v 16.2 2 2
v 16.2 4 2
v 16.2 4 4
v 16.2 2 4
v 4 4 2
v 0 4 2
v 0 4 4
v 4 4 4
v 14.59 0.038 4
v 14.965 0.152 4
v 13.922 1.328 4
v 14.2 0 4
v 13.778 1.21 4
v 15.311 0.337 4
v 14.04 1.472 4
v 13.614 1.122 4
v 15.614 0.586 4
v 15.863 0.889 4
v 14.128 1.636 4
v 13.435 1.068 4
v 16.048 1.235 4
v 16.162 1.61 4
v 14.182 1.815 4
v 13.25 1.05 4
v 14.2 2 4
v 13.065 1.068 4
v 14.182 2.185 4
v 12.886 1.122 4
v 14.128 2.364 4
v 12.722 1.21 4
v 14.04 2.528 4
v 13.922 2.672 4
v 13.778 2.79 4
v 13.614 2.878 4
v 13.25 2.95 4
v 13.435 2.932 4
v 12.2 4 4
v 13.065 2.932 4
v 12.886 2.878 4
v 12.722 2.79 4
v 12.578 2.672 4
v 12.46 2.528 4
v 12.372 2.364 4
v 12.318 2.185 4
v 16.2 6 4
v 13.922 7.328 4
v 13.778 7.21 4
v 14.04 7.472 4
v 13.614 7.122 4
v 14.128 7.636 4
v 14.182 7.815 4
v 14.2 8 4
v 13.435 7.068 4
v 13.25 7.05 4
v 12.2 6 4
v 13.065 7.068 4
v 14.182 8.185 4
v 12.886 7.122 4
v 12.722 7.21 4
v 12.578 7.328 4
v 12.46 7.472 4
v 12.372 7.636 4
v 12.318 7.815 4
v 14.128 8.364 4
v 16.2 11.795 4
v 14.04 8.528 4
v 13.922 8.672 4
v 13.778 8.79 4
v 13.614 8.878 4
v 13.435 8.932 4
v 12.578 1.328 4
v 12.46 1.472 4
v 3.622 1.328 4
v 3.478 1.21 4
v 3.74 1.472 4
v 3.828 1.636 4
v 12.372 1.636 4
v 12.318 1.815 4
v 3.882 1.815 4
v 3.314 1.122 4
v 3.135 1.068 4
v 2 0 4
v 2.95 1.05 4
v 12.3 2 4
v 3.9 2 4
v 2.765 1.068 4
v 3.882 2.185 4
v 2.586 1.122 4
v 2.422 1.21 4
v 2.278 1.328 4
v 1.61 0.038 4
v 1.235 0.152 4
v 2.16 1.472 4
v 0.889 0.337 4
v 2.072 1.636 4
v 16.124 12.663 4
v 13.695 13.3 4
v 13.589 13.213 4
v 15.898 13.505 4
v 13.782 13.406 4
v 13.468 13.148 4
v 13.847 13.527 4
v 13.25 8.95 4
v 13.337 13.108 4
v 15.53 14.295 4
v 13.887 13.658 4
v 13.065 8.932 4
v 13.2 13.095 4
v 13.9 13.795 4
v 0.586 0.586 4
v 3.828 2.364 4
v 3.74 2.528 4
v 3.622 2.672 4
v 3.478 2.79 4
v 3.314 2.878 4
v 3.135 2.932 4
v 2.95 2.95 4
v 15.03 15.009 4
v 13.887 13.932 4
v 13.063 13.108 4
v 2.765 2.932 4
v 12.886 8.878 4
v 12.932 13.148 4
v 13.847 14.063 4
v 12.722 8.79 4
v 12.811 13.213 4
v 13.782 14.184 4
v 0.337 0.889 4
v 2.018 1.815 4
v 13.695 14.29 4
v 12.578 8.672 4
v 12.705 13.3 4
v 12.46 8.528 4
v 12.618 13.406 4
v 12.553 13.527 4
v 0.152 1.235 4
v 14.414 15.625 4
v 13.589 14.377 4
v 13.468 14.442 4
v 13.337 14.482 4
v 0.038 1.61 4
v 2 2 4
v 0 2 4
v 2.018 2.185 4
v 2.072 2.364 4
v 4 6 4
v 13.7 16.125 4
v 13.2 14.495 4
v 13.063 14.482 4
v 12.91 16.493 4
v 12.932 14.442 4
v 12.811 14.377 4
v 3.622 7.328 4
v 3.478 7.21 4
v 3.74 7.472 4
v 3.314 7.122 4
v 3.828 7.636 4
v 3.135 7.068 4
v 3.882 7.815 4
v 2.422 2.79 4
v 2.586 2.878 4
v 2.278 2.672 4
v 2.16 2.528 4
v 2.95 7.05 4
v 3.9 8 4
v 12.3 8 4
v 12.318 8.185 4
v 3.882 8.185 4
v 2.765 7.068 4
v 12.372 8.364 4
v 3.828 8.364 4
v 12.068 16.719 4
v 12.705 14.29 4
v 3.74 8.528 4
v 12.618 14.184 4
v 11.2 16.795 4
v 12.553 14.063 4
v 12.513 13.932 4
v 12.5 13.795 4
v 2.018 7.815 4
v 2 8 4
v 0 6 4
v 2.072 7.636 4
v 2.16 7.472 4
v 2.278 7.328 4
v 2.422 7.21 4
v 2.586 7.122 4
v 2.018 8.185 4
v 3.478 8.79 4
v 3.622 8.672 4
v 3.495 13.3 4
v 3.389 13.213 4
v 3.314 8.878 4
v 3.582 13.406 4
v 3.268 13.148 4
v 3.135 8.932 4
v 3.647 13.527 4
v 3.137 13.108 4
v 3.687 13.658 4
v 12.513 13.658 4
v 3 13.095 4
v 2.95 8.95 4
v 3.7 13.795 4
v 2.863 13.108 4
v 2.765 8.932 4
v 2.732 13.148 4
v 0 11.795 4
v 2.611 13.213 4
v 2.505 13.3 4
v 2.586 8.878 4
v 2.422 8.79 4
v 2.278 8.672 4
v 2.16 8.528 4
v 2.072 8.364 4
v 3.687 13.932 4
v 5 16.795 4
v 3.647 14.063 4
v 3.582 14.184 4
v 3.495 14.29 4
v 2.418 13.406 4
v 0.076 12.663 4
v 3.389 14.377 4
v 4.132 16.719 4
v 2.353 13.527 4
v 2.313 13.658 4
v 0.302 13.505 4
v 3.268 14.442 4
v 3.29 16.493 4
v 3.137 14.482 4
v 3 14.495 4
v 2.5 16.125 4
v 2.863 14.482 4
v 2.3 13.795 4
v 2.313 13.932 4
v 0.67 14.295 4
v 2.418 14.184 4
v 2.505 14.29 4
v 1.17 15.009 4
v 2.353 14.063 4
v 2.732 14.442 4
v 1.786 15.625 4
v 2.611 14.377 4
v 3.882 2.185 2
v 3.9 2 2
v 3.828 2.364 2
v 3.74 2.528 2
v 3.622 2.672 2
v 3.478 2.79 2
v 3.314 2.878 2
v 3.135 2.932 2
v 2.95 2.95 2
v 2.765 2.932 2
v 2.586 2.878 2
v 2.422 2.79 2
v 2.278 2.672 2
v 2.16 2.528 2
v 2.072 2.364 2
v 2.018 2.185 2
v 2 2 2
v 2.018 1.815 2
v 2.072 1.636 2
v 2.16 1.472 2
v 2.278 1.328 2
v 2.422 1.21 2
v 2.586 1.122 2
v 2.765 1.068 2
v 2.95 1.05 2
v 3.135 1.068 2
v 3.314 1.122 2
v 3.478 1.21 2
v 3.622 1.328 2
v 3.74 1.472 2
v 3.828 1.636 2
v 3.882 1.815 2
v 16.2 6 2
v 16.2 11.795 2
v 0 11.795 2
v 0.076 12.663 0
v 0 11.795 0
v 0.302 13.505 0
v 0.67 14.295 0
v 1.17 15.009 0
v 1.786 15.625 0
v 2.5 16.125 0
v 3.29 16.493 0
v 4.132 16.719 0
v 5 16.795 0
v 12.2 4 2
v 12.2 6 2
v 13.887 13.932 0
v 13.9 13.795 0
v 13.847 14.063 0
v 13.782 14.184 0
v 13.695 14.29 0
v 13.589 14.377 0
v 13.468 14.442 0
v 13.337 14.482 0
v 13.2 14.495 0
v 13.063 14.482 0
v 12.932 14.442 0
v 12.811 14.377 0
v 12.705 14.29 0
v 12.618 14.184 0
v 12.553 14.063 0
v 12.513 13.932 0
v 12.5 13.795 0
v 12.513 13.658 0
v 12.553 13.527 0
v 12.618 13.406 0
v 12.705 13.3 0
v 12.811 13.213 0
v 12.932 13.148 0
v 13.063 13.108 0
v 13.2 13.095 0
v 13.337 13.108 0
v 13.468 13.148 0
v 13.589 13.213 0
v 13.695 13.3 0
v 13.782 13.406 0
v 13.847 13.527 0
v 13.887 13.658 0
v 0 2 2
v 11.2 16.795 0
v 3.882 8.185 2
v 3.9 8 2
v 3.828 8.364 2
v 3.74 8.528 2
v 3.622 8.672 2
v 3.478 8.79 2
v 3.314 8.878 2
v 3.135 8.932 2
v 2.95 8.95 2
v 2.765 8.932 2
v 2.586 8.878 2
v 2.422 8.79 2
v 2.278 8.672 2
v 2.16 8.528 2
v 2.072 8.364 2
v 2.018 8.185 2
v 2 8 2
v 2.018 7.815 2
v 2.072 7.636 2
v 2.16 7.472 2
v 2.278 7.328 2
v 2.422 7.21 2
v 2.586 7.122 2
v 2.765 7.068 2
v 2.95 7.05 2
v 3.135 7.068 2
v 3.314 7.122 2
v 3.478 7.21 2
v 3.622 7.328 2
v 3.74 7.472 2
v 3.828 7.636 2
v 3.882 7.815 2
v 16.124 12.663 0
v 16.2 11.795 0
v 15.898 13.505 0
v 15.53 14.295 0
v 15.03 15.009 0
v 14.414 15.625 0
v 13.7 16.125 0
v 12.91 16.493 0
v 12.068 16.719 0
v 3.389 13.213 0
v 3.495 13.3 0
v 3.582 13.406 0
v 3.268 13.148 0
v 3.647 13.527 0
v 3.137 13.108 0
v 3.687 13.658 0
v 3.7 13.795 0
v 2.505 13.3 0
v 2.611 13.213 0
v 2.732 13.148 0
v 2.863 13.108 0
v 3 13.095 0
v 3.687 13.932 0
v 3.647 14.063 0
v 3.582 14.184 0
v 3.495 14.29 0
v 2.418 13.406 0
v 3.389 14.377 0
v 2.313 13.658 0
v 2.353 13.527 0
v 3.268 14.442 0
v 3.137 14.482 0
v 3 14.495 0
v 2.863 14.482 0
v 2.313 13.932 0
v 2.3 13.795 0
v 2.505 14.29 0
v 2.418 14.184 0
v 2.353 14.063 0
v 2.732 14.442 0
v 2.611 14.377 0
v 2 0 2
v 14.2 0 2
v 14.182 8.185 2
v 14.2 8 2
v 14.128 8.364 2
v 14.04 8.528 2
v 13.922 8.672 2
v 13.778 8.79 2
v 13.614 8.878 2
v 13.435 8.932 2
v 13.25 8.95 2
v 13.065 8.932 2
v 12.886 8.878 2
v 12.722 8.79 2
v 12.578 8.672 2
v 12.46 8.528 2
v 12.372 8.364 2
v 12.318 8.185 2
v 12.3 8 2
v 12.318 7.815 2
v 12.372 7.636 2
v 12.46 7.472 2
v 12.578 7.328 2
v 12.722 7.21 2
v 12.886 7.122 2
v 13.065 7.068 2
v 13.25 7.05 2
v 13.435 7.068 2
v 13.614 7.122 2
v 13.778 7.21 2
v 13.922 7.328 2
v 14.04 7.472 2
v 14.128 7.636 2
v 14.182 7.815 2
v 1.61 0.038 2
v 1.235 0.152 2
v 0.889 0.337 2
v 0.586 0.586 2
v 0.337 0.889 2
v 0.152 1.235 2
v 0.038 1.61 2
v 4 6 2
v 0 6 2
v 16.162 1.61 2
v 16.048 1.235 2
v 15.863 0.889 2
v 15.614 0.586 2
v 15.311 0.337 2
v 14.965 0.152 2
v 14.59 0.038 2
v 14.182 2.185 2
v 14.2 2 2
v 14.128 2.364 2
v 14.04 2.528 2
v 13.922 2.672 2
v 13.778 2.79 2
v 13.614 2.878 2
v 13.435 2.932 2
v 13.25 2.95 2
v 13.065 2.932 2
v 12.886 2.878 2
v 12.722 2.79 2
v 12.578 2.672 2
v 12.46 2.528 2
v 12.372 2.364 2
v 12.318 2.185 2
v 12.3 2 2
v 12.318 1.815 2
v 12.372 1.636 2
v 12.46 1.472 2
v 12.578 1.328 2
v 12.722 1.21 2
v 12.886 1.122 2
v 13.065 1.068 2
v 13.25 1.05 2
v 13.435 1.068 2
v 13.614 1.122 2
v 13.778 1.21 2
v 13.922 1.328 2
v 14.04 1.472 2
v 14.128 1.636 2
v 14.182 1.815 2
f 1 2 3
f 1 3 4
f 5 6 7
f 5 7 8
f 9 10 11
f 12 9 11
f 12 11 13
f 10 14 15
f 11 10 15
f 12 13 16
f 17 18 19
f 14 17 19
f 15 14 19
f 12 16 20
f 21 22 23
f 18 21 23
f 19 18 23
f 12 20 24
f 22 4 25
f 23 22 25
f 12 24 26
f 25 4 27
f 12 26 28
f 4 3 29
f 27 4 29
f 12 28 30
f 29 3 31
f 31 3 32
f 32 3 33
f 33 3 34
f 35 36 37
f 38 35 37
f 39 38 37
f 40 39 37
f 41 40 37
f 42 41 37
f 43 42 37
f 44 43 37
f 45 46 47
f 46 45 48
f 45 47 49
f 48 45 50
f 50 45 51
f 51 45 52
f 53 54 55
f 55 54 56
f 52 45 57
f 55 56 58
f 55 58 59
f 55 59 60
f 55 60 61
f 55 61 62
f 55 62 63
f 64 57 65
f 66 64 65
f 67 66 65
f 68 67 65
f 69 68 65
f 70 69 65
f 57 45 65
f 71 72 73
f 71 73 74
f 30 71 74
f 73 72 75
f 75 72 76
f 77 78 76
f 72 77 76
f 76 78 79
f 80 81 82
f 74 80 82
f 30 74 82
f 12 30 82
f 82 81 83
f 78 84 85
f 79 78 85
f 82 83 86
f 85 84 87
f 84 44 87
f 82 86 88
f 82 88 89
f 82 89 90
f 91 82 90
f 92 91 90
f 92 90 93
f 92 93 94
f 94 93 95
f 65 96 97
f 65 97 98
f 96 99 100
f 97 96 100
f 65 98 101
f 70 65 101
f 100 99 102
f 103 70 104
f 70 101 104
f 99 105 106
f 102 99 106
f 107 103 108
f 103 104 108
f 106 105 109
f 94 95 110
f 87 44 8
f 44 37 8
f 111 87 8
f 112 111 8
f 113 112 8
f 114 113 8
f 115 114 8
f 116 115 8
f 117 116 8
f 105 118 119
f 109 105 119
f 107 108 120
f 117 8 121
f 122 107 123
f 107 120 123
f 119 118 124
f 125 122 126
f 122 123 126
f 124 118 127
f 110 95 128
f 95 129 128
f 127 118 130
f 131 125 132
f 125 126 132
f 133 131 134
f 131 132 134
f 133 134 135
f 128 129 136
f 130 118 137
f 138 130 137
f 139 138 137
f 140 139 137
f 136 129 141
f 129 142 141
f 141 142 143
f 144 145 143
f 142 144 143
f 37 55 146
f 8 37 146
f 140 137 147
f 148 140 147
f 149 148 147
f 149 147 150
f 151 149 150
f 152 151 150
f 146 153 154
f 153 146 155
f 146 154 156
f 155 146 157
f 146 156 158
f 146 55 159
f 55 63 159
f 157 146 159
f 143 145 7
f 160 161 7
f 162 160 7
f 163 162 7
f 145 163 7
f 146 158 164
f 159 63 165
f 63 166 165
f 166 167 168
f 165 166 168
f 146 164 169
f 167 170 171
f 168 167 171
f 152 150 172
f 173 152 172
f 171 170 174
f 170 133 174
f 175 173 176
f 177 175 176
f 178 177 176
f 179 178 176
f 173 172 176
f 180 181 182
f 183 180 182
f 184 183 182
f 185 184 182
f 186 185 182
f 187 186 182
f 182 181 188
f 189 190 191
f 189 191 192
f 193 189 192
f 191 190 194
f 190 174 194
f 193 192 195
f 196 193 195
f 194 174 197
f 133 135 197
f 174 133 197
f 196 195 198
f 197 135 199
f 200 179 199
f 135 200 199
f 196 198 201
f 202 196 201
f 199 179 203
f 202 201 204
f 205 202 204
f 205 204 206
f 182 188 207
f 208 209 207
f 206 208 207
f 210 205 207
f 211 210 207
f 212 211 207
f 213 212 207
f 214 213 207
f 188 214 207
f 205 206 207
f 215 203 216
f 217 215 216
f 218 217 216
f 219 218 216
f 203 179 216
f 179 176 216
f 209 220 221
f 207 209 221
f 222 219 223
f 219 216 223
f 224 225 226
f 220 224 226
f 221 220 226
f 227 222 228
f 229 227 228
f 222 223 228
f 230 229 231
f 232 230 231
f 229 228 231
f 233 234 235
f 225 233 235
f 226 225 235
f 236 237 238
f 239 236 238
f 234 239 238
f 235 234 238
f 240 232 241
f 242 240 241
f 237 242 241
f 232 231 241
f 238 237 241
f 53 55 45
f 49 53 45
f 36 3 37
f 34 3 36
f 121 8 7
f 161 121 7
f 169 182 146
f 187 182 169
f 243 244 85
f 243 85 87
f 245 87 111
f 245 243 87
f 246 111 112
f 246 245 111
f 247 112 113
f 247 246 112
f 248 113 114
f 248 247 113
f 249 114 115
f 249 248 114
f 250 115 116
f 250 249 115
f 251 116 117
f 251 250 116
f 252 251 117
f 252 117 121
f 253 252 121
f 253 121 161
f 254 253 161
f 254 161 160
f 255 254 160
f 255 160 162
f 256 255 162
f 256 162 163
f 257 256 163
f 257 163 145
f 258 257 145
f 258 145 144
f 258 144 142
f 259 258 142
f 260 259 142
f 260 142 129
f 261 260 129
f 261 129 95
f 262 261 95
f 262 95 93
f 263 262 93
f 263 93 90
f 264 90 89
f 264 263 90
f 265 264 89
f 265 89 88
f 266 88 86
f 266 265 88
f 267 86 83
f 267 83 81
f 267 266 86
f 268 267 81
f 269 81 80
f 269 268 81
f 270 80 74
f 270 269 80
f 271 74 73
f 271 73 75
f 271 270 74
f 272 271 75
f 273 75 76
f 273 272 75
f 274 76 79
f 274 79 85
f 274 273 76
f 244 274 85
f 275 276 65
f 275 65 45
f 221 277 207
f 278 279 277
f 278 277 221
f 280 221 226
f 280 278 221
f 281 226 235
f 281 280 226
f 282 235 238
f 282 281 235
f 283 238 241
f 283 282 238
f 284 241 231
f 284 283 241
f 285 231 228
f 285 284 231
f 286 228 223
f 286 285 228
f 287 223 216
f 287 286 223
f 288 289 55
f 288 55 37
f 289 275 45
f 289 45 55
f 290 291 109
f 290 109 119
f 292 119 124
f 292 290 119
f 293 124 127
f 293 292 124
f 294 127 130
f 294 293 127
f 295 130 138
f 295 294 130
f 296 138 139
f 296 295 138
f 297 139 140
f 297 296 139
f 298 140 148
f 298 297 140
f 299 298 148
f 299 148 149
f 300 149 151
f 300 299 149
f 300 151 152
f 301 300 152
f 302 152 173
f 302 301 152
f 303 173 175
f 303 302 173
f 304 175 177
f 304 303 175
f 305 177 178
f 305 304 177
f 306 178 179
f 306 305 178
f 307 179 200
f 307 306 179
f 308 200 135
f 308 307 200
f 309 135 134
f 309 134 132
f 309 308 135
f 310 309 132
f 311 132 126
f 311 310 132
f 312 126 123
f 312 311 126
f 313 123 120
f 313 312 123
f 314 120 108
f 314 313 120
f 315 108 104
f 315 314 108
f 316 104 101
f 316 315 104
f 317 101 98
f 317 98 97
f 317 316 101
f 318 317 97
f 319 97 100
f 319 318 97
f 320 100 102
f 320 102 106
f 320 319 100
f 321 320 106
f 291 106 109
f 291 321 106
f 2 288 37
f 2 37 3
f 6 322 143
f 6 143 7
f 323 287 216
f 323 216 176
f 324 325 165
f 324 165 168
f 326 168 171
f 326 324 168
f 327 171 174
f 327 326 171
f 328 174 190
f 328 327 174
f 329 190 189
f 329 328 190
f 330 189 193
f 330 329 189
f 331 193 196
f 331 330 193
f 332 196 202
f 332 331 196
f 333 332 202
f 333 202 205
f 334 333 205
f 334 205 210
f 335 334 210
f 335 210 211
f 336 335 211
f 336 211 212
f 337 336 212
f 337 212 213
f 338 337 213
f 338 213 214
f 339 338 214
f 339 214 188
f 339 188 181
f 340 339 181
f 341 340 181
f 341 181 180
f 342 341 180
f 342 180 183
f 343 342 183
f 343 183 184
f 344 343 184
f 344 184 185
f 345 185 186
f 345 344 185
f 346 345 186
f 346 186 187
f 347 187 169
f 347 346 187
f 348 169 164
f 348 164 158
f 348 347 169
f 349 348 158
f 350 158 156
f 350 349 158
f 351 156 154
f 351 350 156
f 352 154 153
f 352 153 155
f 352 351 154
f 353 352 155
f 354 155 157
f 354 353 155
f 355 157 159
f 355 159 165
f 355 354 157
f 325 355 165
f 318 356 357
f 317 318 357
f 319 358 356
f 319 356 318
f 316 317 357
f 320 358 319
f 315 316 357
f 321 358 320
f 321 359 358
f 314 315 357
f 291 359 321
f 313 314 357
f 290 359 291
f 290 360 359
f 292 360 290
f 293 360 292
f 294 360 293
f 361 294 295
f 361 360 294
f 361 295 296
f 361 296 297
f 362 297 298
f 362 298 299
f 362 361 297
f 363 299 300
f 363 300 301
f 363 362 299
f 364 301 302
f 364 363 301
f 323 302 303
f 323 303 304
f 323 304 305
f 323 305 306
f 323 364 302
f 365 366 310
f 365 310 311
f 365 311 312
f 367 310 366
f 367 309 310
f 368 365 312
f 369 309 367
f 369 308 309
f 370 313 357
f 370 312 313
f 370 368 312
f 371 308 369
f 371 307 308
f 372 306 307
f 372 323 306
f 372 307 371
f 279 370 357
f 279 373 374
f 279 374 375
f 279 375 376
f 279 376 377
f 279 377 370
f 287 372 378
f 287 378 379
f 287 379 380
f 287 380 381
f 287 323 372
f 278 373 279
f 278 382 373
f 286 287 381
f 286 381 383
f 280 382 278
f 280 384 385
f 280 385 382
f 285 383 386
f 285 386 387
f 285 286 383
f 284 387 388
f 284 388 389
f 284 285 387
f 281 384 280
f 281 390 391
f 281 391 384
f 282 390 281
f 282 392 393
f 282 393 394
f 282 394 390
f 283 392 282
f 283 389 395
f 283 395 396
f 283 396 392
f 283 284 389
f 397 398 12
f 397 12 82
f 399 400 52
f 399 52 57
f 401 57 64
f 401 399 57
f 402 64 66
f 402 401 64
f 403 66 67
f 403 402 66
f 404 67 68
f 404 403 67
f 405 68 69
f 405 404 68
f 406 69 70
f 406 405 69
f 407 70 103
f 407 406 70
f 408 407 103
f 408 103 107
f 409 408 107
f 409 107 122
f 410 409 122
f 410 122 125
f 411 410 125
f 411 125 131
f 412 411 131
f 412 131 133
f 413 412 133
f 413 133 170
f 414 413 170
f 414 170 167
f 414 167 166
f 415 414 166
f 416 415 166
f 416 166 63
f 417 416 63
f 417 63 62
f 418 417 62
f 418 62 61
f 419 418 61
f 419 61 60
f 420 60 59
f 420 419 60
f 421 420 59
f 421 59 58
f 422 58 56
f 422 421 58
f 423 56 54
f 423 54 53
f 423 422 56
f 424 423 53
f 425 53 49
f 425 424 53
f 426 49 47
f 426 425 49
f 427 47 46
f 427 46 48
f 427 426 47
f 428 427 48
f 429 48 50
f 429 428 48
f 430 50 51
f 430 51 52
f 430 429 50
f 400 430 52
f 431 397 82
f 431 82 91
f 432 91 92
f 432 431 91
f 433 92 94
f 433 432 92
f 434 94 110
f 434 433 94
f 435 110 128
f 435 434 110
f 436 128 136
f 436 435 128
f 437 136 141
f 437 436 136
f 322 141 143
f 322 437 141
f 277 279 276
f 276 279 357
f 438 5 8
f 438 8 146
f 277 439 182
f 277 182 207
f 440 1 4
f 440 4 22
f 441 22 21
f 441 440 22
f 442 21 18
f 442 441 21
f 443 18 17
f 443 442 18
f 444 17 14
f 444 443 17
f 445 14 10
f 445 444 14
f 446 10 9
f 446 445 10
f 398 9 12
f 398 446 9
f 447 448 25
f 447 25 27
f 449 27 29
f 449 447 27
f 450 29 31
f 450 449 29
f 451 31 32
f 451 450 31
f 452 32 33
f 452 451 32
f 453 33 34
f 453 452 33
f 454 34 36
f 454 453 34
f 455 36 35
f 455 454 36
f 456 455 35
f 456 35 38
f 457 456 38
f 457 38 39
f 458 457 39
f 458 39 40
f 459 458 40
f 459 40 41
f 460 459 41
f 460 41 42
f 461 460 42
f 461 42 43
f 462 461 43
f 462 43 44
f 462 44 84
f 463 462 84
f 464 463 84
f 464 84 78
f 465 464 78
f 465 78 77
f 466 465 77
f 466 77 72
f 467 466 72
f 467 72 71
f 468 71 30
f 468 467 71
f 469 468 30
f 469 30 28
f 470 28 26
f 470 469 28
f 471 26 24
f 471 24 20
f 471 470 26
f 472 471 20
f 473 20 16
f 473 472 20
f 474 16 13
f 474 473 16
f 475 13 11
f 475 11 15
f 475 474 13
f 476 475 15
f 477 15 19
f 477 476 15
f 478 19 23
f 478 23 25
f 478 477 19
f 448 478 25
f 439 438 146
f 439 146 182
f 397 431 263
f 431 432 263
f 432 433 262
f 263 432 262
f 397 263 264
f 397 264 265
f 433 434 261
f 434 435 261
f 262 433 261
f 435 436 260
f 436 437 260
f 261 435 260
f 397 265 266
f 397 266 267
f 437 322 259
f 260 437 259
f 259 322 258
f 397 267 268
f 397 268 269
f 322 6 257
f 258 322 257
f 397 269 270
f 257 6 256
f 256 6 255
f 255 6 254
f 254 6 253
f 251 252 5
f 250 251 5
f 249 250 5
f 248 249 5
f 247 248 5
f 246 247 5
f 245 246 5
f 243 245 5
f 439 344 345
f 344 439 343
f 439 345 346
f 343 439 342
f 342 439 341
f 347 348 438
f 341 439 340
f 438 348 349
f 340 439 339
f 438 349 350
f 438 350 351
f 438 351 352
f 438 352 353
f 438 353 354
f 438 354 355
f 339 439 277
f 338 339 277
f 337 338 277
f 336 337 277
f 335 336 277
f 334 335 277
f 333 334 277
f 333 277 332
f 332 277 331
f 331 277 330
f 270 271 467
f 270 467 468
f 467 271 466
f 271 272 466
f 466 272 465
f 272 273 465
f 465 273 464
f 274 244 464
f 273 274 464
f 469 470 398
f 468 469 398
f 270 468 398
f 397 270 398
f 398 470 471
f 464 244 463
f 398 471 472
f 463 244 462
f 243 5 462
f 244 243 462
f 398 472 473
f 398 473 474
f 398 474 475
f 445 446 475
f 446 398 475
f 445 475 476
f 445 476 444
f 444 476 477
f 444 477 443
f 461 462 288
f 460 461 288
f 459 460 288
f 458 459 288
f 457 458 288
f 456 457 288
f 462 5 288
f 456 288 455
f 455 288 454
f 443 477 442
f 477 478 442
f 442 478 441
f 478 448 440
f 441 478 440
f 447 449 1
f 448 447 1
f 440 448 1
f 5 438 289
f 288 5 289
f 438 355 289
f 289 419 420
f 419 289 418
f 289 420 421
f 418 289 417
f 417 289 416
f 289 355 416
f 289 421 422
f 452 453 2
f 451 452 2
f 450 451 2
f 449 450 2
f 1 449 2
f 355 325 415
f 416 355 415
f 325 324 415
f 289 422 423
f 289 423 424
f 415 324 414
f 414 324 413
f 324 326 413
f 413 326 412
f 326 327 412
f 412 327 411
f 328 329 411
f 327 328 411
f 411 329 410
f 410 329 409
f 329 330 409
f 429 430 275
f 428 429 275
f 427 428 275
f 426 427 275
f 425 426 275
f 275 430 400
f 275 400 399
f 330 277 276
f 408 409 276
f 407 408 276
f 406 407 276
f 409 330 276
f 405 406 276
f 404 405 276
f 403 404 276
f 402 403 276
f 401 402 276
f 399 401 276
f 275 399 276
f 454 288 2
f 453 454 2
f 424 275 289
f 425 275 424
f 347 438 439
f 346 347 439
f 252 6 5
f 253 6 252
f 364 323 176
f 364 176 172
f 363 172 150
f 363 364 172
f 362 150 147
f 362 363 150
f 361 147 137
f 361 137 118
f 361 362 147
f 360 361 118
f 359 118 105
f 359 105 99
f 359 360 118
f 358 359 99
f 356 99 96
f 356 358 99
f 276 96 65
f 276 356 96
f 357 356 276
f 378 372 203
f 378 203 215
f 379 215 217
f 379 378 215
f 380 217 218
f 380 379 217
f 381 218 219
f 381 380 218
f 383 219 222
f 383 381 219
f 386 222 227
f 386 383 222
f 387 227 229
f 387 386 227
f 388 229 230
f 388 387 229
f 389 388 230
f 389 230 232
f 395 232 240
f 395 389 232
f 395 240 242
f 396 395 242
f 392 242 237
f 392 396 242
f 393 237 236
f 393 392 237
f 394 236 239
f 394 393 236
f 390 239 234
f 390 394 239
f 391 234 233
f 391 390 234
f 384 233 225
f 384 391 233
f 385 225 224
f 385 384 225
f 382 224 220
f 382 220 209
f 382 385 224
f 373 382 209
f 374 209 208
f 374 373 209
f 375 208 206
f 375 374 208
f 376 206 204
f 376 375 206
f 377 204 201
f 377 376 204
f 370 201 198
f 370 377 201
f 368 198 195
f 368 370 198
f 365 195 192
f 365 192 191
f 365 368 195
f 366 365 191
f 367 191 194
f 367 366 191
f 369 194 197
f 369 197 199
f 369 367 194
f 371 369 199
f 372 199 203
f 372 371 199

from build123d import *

# Parameters (mm, degrees)
SKETCH1_R           = 0.95
SKETCH1_R_2         = 0.7
BOSS_EXTRUDE1_DEPTH = 4
SKETCH2_W           = 16.2
SKETCH2_H           = 11.795
CUT_EXTRUDE1_DEPTH  = 2


with BuildPart() as part:
    # Sketch1 → Boss-Extrude1 (new body)
    with BuildSketch(Plane.XY):
        with BuildLine():
            Line((0, 6), (0, 11.795))
            ThreePointArc((0, 11.795), (1.464466094, 15.330533906), (5, 16.795))
            Line((5, 16.795), (11.2, 16.795))
            ThreePointArc((11.2, 16.795), (14.735533906, 15.330533906), (16.2, 11.795))
            Line((16.2, 11.795), (16.2, 6))
            Line((16.2, 6), (12.2, 6))
            Line((12.2, 6), (12.2, 4))
            Line((12.2, 4), (16.2, 4))
            Line((16.2, 4), (16.2, 2))
            ThreePointArc((16.2, 2), (15.614213562, 0.585786438), (14.2, 0))
            Line((14.2, 0), (2, 0))
            ThreePointArc((2, 0), (0.585786438, 0.585786438), (0, 2))
            Line((0, 2), (0, 4))
            Line((0, 4), (4, 4))
            Line((4, 4), (4, 6))
            Line((4, 6), (0, 6))
        make_face()
        with Locations((13.25, 2)):
            Circle(SKETCH1_R, mode=Mode.SUBTRACT)
        with Locations((13.25, 8)):
            Circle(SKETCH1_R, mode=Mode.SUBTRACT)
        with Locations((3, 13.795)):
            Circle(SKETCH1_R_2, mode=Mode.SUBTRACT)
        with Locations((13.2, 13.795)):
            Circle(SKETCH1_R_2, mode=Mode.SUBTRACT)
        with Locations((2.95, 8)):
            Circle(SKETCH1_R, mode=Mode.SUBTRACT)
        with Locations((2.95, 2)):
            Circle(SKETCH1_R, mode=Mode.SUBTRACT)
    extrude(amount=BOSS_EXTRUDE1_DEPTH)

    # Sketch2 → Cut-Extrude1 (cut)
    with BuildSketch(Plane.XY):
        with Locations((8.1, 5.8975)):
            Rectangle(SKETCH2_W, SKETCH2_H)
    extrude(amount=CUT_EXTRUDE1_DEPTH, mode=Mode.SUBTRACT)


solid = part.part
